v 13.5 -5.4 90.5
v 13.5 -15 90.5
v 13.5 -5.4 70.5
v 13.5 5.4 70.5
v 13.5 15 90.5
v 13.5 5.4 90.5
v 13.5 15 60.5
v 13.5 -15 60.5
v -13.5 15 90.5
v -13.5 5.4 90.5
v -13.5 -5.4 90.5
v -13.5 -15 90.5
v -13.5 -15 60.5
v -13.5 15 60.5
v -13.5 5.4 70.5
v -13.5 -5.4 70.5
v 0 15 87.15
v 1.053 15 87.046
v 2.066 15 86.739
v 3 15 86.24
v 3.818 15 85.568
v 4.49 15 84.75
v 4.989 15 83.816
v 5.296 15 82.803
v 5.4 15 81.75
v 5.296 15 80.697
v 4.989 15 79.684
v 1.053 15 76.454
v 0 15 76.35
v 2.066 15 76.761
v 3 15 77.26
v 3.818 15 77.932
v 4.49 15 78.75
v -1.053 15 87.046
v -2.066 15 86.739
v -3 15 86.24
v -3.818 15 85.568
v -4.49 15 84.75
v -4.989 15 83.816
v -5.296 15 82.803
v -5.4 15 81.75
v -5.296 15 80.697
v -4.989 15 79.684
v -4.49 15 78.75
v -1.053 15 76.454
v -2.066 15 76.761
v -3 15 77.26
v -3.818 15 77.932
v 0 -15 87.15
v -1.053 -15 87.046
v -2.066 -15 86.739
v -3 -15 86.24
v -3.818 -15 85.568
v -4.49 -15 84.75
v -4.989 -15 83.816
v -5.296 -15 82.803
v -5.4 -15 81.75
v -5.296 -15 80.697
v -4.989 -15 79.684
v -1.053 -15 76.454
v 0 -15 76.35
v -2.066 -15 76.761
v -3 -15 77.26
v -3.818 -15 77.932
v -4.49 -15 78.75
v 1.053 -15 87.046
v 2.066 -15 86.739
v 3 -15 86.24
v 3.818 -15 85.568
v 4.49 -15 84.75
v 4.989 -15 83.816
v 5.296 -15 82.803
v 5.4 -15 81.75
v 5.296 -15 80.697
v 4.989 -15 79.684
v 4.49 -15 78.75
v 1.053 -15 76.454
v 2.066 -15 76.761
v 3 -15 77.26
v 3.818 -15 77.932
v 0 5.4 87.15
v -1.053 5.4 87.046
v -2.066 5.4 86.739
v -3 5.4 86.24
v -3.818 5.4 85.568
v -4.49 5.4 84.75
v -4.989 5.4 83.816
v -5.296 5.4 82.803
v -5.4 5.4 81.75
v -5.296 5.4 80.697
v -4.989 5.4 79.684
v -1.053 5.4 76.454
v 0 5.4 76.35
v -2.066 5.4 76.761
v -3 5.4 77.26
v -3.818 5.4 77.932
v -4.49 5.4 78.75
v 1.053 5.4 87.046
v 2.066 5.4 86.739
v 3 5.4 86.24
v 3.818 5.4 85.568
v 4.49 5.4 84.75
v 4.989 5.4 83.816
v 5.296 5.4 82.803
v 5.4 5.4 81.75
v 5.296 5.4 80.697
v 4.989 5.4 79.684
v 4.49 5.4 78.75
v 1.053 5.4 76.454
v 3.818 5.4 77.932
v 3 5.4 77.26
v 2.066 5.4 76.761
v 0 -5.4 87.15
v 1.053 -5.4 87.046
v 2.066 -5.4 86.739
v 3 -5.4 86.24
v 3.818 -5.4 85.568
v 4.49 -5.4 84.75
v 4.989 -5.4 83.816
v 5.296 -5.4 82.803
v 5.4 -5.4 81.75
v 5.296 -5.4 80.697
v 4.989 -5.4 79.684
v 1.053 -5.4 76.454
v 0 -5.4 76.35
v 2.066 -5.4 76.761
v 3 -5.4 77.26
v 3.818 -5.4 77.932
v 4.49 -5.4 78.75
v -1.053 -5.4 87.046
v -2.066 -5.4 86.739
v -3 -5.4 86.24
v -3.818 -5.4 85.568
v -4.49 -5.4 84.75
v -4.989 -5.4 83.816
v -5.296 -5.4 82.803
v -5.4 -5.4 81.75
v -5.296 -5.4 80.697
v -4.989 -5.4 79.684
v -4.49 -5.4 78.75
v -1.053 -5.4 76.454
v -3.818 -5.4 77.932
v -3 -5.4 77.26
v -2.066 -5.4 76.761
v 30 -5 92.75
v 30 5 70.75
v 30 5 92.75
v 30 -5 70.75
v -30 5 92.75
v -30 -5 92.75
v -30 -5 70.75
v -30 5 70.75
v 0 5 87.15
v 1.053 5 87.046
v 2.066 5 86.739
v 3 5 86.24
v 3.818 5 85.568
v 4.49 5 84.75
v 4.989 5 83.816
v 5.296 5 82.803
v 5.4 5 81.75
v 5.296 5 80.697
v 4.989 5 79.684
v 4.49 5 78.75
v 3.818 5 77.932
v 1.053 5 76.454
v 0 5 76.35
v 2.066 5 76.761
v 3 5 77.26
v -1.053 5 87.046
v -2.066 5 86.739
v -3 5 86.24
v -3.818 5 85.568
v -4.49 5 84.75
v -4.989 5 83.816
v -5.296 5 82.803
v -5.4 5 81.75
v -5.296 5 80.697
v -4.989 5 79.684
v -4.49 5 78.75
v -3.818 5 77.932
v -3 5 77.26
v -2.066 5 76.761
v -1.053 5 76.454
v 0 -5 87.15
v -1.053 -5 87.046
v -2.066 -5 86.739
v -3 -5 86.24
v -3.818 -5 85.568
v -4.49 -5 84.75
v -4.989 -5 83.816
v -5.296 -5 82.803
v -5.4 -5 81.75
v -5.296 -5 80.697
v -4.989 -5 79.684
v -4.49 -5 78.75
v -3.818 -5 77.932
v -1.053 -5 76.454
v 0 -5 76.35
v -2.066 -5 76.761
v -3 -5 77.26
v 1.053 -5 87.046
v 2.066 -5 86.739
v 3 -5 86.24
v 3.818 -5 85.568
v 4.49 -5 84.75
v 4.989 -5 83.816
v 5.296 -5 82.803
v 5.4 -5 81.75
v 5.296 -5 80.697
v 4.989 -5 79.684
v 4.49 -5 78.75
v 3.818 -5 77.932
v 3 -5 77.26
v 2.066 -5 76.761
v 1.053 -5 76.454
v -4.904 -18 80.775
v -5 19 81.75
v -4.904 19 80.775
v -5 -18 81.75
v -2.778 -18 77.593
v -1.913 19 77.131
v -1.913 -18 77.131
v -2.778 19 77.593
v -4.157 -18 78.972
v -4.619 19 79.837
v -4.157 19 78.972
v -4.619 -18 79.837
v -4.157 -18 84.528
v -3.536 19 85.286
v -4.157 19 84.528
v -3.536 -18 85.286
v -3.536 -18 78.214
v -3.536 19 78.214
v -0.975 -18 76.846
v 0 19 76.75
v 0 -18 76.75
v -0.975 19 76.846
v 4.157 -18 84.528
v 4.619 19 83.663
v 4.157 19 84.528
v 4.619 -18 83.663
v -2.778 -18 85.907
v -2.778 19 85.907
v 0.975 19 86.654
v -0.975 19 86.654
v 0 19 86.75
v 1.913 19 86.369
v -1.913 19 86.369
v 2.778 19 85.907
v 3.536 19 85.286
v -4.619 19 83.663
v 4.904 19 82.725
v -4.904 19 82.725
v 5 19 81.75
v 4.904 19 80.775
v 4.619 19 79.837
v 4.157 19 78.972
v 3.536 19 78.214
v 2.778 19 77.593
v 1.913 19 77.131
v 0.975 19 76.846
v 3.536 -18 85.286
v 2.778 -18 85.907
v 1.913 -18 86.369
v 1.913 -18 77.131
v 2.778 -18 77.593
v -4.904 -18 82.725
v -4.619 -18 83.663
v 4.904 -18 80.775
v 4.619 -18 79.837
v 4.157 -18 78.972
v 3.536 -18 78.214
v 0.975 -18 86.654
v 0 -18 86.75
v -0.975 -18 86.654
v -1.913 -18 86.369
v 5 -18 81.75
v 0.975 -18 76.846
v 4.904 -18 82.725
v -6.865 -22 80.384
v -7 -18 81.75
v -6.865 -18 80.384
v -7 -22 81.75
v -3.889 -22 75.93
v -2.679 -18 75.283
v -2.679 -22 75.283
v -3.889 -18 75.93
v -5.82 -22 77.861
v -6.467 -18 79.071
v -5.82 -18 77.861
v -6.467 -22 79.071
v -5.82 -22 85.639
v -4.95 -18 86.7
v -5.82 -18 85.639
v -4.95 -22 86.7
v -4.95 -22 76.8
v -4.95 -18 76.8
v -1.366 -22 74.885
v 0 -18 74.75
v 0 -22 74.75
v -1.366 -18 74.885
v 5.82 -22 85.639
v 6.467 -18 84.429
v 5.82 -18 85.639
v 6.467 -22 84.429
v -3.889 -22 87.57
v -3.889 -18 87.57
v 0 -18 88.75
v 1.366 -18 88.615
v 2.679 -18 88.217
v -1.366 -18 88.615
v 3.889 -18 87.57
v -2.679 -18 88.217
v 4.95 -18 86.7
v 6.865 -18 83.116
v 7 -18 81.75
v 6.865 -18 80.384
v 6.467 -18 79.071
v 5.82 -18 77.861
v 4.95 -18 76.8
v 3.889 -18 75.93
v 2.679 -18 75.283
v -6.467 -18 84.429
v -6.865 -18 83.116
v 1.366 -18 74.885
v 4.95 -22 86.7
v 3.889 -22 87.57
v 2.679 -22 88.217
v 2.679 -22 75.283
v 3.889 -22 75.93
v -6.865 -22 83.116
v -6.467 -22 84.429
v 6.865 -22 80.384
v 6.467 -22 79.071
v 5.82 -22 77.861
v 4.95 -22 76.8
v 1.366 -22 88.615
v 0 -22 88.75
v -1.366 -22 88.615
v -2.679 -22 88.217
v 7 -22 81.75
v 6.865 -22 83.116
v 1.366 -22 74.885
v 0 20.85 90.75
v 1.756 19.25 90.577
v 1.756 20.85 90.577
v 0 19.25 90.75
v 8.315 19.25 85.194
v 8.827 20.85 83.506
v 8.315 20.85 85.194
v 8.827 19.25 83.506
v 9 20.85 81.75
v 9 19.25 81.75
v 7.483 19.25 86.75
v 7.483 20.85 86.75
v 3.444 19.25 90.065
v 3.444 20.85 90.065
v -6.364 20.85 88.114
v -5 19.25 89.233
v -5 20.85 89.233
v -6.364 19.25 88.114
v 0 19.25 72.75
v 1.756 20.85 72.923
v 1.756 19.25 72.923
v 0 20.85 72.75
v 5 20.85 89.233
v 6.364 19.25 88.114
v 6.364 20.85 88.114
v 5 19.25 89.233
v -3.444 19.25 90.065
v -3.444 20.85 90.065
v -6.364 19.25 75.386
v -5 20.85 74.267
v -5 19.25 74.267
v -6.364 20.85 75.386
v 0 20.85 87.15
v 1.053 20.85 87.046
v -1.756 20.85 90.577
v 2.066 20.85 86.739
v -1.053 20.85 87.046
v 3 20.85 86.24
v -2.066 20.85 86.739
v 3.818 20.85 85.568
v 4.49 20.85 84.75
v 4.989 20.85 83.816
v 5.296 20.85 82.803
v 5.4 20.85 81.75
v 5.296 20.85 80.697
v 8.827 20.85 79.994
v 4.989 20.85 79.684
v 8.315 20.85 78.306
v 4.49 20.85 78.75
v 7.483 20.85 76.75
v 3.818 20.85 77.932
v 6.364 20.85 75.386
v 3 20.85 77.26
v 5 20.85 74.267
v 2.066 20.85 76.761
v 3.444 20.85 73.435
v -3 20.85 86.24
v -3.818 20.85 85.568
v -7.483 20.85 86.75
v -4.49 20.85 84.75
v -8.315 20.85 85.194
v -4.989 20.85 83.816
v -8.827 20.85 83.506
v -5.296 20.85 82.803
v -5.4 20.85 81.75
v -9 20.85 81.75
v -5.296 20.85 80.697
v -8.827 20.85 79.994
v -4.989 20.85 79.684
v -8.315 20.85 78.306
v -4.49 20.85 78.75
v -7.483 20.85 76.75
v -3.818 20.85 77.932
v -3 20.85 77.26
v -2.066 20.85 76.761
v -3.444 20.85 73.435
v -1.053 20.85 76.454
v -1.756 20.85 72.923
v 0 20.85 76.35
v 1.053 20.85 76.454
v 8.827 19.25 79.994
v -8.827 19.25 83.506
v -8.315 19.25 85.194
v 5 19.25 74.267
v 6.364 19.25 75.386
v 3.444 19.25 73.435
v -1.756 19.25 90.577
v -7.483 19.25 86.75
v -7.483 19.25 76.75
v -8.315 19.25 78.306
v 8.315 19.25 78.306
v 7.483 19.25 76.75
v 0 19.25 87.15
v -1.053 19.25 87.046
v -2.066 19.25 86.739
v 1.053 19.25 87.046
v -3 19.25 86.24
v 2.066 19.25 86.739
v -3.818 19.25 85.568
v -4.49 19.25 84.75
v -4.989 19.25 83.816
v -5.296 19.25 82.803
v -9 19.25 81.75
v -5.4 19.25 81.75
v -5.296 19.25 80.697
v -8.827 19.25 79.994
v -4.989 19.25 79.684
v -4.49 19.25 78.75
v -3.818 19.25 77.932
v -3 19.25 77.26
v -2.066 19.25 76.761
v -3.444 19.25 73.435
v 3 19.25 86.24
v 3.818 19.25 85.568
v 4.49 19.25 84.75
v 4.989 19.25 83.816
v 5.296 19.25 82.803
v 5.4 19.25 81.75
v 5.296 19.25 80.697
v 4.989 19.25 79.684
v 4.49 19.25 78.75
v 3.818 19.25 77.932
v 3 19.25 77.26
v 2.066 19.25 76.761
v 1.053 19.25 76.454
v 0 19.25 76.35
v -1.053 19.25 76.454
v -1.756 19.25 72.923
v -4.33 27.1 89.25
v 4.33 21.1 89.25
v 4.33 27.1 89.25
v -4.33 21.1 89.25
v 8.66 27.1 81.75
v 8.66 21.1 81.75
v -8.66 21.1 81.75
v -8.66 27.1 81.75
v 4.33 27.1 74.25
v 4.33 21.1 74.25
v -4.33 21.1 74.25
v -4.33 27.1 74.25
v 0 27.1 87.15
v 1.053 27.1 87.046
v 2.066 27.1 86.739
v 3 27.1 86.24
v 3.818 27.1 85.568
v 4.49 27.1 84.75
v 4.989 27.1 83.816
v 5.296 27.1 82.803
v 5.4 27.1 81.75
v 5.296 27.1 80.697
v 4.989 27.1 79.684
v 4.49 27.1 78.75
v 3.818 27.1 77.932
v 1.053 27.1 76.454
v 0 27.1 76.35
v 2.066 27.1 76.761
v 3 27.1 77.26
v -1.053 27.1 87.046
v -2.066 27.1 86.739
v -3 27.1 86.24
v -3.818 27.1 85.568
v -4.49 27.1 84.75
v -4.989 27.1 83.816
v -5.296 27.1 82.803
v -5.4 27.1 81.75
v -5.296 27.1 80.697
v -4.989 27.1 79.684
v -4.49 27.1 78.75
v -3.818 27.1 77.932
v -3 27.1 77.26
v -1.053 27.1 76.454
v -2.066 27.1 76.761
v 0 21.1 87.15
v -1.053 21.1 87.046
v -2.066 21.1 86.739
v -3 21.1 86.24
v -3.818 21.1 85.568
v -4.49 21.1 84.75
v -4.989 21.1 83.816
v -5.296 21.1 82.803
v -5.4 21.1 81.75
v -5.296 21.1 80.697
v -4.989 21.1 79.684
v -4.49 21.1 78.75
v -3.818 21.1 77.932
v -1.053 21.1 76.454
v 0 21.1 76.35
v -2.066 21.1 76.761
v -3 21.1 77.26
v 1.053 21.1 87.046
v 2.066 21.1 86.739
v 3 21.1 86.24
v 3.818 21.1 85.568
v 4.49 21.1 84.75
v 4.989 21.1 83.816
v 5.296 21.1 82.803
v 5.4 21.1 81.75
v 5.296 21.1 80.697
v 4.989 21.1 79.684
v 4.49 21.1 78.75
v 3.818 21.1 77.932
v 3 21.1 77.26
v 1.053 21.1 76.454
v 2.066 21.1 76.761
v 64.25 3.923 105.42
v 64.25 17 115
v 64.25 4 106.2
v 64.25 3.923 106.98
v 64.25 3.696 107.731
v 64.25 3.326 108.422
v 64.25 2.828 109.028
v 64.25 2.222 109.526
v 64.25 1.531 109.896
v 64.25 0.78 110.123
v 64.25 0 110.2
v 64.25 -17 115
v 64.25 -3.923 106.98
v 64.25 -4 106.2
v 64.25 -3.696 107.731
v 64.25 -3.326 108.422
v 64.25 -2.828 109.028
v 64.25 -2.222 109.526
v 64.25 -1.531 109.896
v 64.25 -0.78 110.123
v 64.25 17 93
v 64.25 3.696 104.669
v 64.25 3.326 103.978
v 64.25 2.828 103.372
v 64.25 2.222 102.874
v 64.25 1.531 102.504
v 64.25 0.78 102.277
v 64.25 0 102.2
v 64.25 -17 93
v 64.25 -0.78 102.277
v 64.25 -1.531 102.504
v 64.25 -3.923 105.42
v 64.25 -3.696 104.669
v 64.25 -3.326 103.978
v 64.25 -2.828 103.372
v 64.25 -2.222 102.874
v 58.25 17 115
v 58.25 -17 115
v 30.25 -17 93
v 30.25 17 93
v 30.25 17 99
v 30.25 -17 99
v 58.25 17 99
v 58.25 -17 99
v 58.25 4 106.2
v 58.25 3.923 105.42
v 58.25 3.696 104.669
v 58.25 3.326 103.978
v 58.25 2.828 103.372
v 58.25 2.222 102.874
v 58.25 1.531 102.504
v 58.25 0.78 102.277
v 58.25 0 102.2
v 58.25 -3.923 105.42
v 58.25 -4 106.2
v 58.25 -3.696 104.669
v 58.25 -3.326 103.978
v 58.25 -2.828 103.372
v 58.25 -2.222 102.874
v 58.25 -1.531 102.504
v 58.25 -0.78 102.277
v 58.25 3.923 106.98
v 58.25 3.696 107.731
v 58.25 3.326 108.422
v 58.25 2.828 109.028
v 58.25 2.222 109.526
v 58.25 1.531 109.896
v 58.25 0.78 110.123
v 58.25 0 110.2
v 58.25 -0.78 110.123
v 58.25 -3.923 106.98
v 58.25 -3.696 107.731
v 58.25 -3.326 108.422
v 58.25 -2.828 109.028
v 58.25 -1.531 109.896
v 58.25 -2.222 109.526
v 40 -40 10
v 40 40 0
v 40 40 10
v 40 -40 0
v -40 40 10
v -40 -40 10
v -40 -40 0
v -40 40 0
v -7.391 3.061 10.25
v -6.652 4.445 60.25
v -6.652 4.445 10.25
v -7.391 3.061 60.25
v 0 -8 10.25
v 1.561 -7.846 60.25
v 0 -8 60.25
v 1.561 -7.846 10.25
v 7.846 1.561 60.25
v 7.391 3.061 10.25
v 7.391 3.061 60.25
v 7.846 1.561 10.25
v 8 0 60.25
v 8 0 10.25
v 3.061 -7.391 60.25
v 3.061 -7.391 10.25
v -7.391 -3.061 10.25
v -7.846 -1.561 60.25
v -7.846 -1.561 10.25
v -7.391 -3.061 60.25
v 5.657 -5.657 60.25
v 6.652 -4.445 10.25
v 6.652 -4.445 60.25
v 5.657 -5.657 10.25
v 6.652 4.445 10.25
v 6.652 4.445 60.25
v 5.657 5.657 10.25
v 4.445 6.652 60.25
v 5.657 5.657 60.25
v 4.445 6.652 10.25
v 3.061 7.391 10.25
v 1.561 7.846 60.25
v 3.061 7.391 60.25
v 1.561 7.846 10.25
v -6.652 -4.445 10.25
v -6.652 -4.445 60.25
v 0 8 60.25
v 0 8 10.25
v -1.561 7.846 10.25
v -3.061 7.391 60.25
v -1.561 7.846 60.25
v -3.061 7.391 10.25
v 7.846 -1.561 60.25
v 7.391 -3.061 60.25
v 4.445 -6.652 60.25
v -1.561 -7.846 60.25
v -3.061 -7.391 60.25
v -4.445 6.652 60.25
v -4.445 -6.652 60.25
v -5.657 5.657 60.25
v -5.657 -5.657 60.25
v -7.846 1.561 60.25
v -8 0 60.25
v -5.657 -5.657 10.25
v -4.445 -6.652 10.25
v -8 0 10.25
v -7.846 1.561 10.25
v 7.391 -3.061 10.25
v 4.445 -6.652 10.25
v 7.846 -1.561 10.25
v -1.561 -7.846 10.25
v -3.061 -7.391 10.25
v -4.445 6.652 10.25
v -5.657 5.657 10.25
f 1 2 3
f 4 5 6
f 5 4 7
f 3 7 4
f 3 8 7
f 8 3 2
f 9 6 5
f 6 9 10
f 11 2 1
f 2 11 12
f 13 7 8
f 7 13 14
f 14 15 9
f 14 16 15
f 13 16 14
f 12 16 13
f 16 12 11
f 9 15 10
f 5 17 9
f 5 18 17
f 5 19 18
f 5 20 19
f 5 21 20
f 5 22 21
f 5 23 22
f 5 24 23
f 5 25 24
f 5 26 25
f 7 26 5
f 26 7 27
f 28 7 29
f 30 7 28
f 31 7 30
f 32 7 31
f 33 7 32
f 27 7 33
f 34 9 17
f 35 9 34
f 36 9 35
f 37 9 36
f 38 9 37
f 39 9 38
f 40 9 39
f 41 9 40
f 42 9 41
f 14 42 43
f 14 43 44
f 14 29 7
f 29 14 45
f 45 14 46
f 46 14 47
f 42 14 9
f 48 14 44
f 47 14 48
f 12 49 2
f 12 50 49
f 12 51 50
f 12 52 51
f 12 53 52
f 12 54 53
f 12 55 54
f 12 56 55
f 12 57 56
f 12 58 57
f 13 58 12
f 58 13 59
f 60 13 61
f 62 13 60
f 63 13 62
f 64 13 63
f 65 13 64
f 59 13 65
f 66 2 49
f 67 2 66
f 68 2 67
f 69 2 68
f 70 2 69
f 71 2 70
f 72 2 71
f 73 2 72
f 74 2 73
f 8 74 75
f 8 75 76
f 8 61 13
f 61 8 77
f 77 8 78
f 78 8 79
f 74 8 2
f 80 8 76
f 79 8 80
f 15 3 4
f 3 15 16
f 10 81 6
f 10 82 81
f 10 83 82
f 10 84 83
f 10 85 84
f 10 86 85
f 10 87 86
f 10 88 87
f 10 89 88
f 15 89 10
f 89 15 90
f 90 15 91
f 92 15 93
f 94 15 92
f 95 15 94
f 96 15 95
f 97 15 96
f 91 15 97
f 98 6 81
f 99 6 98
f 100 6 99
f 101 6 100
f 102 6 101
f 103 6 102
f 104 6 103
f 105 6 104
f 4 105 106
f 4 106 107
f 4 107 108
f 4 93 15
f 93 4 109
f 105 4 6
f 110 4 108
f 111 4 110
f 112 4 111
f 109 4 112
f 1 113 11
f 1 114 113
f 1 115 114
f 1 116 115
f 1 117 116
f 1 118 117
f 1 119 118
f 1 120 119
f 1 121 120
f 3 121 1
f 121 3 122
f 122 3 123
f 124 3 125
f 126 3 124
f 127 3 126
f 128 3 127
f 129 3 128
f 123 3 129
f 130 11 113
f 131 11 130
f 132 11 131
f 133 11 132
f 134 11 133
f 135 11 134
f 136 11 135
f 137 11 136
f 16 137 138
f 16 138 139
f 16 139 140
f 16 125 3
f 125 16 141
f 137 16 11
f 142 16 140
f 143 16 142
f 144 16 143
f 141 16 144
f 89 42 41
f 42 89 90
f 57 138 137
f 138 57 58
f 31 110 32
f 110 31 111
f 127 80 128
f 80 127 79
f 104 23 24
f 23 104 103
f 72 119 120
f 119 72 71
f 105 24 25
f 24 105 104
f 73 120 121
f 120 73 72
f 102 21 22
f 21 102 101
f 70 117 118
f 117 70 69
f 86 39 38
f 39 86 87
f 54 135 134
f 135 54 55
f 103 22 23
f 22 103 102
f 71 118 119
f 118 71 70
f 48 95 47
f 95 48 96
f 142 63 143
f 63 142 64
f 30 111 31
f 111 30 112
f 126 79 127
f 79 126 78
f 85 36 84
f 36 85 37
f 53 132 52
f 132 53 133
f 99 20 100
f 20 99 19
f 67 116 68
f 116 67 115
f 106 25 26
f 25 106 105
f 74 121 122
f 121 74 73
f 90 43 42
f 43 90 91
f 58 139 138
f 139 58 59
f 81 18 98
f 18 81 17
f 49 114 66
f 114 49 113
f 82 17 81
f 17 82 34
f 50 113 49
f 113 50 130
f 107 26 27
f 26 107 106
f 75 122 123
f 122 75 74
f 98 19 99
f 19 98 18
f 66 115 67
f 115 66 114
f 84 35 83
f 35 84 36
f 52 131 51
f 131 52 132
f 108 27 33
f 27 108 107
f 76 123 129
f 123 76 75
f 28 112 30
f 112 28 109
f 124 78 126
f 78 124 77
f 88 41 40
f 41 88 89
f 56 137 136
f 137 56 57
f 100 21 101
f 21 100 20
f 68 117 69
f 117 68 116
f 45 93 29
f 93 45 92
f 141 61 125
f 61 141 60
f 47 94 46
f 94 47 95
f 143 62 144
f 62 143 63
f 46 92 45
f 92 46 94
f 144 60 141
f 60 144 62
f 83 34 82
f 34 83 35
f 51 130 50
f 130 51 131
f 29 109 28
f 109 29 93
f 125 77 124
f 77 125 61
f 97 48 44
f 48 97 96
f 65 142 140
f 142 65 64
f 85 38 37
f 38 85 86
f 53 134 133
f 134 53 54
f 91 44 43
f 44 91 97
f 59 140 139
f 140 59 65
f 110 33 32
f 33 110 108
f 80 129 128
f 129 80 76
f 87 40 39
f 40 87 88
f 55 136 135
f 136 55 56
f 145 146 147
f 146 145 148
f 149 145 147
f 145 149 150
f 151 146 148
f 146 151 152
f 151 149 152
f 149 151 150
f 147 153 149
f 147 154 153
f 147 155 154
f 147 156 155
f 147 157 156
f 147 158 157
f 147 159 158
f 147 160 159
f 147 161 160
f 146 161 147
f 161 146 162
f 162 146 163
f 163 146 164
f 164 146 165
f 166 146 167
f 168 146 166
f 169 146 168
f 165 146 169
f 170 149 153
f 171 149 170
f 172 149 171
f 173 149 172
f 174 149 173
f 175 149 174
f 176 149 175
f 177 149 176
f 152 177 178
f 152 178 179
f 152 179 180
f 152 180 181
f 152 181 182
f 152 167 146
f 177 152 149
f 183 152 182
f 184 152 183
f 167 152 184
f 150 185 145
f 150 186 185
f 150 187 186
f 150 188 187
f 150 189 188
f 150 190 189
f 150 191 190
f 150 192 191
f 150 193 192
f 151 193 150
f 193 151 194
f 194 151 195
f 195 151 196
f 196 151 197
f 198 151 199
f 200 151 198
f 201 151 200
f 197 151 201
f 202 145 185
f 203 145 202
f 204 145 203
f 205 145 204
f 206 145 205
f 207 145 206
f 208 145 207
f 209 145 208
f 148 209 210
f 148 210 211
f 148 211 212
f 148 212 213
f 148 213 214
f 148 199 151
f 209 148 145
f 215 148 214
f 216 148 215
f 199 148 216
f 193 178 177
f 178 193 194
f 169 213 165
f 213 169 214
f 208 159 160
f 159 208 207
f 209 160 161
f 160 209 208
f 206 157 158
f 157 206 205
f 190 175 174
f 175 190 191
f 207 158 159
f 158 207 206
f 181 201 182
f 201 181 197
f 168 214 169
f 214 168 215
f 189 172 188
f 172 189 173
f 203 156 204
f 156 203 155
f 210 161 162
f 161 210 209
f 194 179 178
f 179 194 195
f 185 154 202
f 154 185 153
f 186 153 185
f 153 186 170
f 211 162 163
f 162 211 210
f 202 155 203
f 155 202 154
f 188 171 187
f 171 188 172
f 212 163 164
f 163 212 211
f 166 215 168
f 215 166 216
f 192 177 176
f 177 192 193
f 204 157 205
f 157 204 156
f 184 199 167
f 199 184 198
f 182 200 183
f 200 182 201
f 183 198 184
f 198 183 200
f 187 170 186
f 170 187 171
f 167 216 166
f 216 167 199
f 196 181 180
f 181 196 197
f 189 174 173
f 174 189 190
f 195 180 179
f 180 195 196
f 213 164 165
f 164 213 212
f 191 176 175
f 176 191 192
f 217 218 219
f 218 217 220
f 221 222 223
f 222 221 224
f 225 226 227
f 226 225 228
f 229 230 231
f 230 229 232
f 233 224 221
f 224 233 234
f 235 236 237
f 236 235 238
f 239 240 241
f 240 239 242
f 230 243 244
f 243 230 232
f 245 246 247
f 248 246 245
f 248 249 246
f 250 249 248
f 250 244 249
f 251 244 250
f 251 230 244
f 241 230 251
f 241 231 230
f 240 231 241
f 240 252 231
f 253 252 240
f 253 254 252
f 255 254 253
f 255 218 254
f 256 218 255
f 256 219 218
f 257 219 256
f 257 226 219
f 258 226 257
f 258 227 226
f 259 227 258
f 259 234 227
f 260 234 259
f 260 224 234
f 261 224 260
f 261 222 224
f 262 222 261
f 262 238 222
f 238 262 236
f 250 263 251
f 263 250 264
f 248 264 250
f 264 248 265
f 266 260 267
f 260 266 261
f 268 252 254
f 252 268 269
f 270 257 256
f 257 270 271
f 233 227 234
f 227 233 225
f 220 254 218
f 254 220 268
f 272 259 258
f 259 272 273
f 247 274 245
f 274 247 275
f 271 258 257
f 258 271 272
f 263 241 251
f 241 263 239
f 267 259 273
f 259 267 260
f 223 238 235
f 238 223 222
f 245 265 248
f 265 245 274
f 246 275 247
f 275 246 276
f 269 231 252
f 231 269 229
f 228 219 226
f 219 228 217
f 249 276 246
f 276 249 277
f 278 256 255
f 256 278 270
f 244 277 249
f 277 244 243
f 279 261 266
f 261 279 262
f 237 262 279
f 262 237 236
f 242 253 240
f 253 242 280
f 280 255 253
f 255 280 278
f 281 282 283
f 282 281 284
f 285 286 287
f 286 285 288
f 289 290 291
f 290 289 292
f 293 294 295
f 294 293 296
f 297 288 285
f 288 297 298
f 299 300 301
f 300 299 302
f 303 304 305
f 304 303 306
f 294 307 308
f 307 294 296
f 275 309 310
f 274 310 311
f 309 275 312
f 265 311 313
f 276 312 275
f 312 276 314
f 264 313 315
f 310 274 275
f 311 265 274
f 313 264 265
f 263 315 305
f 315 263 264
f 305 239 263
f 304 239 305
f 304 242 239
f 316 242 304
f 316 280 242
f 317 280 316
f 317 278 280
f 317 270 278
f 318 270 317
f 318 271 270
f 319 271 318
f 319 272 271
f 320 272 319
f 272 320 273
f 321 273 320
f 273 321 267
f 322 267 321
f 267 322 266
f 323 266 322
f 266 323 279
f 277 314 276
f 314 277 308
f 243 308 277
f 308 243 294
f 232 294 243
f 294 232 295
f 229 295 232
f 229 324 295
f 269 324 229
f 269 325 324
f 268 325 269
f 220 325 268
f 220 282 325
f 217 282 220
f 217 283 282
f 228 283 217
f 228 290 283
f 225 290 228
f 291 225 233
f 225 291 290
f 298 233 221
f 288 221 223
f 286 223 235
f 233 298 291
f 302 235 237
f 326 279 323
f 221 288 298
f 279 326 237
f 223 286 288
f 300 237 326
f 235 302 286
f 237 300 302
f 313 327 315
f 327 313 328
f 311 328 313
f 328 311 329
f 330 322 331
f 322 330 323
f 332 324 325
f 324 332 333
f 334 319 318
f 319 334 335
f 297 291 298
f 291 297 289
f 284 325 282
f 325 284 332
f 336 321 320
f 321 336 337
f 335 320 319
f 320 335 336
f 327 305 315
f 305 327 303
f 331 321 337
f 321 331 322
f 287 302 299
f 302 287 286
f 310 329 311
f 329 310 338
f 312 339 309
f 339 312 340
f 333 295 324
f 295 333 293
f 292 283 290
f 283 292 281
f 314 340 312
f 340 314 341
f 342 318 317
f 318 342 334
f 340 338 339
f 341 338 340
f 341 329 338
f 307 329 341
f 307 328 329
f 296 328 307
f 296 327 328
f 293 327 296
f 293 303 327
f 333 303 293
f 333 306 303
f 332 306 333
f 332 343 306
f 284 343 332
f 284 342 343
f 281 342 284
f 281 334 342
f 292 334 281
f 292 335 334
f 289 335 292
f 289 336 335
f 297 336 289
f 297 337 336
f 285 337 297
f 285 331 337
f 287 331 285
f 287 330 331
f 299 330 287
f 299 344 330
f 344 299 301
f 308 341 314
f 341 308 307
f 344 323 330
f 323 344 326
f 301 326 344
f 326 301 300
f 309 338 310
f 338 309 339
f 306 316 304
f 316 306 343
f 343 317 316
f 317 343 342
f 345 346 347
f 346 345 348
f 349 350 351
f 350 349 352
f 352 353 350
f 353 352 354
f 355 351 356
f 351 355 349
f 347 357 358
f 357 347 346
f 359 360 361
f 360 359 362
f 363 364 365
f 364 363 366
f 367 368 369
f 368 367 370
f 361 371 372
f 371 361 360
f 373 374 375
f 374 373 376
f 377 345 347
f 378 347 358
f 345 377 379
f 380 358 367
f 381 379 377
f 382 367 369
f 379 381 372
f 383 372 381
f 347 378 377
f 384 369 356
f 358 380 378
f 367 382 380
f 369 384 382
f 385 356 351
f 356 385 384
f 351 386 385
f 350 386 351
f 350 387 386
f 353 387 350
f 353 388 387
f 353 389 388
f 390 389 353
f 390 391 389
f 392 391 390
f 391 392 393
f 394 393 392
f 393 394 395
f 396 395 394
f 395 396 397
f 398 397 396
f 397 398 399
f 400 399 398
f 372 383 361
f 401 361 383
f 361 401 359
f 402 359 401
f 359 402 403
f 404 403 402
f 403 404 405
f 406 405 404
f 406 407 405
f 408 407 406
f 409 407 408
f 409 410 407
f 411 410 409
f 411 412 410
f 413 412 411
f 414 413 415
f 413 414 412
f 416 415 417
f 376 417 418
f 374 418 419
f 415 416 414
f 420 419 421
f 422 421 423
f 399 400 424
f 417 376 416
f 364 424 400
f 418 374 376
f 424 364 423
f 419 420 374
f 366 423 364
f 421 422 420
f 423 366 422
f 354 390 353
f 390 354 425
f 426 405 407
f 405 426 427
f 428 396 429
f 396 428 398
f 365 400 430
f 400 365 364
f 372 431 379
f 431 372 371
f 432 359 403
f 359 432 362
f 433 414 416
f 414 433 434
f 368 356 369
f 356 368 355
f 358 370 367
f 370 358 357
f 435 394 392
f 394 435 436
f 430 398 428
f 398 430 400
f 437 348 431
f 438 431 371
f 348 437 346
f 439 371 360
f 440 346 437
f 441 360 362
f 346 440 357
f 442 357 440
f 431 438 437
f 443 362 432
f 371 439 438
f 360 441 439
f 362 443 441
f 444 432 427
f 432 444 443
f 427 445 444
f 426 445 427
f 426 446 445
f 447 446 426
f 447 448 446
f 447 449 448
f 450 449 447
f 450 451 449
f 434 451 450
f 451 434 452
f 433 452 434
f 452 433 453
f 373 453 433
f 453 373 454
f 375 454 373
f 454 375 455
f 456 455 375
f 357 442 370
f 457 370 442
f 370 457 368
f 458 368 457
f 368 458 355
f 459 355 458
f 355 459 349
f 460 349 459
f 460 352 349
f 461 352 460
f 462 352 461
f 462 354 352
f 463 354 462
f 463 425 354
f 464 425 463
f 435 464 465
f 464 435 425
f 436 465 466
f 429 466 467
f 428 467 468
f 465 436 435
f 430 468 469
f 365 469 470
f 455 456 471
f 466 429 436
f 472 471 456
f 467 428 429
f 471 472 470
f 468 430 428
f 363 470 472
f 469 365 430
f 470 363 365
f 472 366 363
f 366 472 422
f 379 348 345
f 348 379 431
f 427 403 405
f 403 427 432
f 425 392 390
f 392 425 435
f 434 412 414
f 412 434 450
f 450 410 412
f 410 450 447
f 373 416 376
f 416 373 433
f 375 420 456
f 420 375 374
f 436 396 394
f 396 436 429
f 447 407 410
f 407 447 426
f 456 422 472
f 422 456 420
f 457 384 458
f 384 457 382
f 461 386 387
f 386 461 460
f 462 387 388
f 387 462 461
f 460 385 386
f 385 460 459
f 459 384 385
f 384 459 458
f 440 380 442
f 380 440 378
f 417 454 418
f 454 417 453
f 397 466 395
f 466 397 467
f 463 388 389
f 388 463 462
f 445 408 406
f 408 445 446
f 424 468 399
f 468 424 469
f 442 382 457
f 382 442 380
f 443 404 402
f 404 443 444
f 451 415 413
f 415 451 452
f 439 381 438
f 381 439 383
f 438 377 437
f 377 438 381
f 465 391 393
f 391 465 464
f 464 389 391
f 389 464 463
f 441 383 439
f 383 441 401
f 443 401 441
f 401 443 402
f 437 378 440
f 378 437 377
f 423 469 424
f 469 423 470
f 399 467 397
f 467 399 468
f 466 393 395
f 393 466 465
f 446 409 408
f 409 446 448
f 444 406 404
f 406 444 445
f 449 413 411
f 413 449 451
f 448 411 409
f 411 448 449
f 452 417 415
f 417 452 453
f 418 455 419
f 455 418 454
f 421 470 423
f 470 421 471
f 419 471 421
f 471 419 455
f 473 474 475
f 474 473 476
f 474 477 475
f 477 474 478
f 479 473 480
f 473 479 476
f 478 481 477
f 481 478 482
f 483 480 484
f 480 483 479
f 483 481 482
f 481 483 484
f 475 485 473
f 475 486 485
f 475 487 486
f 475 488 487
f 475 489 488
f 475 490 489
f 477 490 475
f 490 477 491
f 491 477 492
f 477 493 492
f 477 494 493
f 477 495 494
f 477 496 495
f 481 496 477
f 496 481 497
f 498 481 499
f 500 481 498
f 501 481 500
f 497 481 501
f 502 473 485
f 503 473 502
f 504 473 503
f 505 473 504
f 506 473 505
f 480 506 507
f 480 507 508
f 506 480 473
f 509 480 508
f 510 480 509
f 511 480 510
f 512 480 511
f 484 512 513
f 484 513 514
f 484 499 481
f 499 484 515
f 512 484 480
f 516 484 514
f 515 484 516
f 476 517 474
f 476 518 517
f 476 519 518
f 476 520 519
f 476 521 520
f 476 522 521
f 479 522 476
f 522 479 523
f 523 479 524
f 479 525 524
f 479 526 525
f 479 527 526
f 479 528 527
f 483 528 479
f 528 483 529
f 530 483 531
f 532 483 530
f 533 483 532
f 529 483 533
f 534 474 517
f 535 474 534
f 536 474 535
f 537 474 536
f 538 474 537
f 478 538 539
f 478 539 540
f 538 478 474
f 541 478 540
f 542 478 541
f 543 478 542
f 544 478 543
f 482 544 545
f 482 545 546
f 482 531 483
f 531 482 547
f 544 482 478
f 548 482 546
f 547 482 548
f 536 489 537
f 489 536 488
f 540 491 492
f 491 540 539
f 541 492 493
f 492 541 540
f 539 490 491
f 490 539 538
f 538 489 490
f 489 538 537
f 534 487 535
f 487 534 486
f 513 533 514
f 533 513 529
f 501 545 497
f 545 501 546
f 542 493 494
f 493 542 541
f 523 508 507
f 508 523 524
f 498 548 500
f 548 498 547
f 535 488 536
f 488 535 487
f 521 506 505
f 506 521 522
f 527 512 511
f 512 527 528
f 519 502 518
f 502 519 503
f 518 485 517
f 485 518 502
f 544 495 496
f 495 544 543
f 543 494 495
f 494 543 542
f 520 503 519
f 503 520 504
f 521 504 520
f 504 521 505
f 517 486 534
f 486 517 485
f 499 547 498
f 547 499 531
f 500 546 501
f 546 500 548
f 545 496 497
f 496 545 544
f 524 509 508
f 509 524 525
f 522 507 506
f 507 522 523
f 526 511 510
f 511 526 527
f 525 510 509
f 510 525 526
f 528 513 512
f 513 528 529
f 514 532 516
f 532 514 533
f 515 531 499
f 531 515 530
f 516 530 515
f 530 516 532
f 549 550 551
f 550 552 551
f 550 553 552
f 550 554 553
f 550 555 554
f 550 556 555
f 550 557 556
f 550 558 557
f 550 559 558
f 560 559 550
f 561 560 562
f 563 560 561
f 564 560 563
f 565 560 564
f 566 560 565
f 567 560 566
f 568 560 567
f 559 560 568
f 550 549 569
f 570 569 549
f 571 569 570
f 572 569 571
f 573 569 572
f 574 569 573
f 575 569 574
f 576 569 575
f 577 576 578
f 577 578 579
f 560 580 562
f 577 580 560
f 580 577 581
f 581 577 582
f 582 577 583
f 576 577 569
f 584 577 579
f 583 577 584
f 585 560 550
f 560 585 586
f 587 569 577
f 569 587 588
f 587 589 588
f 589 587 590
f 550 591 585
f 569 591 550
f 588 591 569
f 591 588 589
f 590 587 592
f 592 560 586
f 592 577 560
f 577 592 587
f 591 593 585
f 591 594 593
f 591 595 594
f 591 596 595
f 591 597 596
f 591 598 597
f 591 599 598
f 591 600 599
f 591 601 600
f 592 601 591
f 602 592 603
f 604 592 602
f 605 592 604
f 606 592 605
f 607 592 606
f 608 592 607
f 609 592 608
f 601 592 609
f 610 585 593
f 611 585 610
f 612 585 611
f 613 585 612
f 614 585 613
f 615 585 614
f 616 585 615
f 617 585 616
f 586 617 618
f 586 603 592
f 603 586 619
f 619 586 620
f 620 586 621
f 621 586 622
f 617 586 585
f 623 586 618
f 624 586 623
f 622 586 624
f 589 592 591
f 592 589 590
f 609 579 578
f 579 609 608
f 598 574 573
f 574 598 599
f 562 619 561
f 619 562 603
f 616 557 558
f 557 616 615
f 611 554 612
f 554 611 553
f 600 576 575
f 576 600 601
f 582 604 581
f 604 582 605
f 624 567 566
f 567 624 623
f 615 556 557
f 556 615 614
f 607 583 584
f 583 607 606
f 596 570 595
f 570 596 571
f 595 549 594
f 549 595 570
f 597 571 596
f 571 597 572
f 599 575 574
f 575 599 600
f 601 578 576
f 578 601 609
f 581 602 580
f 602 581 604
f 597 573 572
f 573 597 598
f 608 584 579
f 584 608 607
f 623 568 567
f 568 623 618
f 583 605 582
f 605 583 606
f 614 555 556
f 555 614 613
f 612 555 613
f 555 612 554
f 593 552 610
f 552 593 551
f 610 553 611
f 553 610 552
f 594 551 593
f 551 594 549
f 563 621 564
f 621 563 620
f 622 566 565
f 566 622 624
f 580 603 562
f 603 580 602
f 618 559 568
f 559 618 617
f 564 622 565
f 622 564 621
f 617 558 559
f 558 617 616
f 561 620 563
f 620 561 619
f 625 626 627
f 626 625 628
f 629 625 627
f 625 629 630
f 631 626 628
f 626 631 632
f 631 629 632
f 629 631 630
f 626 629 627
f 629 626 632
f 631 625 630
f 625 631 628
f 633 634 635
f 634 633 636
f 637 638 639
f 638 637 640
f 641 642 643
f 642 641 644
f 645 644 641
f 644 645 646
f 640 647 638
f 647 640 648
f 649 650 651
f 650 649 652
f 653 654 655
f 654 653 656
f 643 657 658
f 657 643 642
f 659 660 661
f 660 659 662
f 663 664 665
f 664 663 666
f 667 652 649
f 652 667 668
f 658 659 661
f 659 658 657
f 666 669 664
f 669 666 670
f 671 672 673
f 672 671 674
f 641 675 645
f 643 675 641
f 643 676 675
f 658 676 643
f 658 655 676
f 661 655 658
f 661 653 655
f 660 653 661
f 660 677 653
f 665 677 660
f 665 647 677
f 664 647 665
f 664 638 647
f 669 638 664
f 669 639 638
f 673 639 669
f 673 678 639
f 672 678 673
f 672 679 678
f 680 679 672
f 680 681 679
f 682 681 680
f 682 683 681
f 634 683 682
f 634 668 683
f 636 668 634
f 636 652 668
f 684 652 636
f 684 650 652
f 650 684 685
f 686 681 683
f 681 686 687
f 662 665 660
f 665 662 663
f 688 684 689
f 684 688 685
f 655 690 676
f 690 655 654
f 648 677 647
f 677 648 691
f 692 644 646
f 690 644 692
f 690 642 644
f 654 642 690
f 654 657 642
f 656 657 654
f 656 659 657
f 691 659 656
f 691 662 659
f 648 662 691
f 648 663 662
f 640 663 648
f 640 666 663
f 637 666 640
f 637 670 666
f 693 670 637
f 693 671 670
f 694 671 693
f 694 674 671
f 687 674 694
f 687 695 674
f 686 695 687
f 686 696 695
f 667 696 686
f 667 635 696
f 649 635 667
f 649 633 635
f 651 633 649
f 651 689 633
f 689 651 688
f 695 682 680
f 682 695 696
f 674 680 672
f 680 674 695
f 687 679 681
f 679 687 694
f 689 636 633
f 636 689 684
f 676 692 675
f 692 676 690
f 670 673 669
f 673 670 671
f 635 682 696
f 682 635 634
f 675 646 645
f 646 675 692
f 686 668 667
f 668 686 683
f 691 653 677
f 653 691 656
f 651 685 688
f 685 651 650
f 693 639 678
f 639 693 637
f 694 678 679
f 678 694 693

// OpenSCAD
$fn = 32;

// ------------------------------------------------------------------------
// Lamp arm: column d16 x 50 mm, arm 60 mm
// Every part is its own module, assembly() places every instance.
// ------------------------------------------------------------------------

// --- part 1 ---
module lamp_base() {
  difference() {
    translate([-40, -40, 0]) cube([80, 80, 10]);
  }
}

// --- part 2 ---
module lamp_column() {
  cylinder(h = 50, d = 16);
}

// --- part 3 ---
module head_fork() {
  difference() {
    translate([-13.5, -15, 0]) cube([27, 30, 30]);
    translate([-14.5, -5.4, 10]) cube([29, 10.8, 21]);
    translate([0, 0, 21.25]) rotate([90, 0, 0]) cylinder(h = 32, d = 10.8, center = true);
  }
}

// --- part 4 ---
module lamp_arm() {
  difference() {
    translate([-30, -5, 0]) cube([60, 10, 22]);
    translate([0, 0, 11]) rotate([90, 0, 0]) cylinder(h = 12, d = 10.8, center = true);
  }
}

// --- part 5 ---
module arm_pin() {
  rotate([0, 90, 0]) cylinder(h = 38, d = 10, center = true);
  translate([-22, 0, 0]) rotate([0, 90, 0]) cylinder(h = 4, d = 14);
}

// --- part 6 ---
module arm_washer() {
  difference() {
      translate([0, 0, 0]) cylinder(h = 1.6, d = 18);
      translate([0, 0, -1]) cylinder(h = 3.6, d = 10.8);
    }
}

// --- part 7 ---
module arm_nut() {
  difference() {
    linear_extrude(height = 6) polygon(points = [[8.66, 0], [4.33, 7.5], [-4.33, 7.5], [-8.66, 0], [-4.33, -7.5], [4.33, -7.5]]);
    translate([0, 0, -1]) cylinder(h = 8, d = 10.8);
  }
}

// --- part 8 ---
module shade_bracket() {
  difference() {
    translate([-17, -17, 0]) cube([34, 34, 22]);
    translate([-18, -18, 6]) cube([29, 36, 17]);
    translate([14, 0, 13.2]) rotate([0, 90, 0]) cylinder(h = 8, d = 8, center = true);
  }
}

// --- assembly ---
module assembly() {
  color([0.80, 0.24, 0.20]) translate([0, 0, 0]) rotate([0, 0, 0]) lamp_base();
  color([0.20, 0.45, 0.75]) translate([0, 0, 10.25]) rotate([0, 0, 0]) lamp_column();
  color([0.25, 0.62, 0.32]) translate([0, 0, 60.5]) rotate([0, 0, 0]) head_fork();
  color([0.92, 0.70, 0.18]) translate([0, 0, 70.75]) rotate([0, 0, 0]) lamp_arm();
  color([0.58, 0.35, 0.70]) translate([0, 0, 81.75]) rotate([0, 0, 90]) arm_pin();
  color([0.16, 0.66, 0.66]) translate([0, 20.85, 81.75]) rotate([90, 0, 0]) arm_washer();
  color([0.85, 0.48, 0.18]) translate([0, 27.1, 81.75]) rotate([90, 0, 0]) arm_nut();
  color([0.55, 0.60, 0.65]) translate([47.25, 0, 93]) rotate([0, 0, 0]) shade_bracket();
}

assembly();
